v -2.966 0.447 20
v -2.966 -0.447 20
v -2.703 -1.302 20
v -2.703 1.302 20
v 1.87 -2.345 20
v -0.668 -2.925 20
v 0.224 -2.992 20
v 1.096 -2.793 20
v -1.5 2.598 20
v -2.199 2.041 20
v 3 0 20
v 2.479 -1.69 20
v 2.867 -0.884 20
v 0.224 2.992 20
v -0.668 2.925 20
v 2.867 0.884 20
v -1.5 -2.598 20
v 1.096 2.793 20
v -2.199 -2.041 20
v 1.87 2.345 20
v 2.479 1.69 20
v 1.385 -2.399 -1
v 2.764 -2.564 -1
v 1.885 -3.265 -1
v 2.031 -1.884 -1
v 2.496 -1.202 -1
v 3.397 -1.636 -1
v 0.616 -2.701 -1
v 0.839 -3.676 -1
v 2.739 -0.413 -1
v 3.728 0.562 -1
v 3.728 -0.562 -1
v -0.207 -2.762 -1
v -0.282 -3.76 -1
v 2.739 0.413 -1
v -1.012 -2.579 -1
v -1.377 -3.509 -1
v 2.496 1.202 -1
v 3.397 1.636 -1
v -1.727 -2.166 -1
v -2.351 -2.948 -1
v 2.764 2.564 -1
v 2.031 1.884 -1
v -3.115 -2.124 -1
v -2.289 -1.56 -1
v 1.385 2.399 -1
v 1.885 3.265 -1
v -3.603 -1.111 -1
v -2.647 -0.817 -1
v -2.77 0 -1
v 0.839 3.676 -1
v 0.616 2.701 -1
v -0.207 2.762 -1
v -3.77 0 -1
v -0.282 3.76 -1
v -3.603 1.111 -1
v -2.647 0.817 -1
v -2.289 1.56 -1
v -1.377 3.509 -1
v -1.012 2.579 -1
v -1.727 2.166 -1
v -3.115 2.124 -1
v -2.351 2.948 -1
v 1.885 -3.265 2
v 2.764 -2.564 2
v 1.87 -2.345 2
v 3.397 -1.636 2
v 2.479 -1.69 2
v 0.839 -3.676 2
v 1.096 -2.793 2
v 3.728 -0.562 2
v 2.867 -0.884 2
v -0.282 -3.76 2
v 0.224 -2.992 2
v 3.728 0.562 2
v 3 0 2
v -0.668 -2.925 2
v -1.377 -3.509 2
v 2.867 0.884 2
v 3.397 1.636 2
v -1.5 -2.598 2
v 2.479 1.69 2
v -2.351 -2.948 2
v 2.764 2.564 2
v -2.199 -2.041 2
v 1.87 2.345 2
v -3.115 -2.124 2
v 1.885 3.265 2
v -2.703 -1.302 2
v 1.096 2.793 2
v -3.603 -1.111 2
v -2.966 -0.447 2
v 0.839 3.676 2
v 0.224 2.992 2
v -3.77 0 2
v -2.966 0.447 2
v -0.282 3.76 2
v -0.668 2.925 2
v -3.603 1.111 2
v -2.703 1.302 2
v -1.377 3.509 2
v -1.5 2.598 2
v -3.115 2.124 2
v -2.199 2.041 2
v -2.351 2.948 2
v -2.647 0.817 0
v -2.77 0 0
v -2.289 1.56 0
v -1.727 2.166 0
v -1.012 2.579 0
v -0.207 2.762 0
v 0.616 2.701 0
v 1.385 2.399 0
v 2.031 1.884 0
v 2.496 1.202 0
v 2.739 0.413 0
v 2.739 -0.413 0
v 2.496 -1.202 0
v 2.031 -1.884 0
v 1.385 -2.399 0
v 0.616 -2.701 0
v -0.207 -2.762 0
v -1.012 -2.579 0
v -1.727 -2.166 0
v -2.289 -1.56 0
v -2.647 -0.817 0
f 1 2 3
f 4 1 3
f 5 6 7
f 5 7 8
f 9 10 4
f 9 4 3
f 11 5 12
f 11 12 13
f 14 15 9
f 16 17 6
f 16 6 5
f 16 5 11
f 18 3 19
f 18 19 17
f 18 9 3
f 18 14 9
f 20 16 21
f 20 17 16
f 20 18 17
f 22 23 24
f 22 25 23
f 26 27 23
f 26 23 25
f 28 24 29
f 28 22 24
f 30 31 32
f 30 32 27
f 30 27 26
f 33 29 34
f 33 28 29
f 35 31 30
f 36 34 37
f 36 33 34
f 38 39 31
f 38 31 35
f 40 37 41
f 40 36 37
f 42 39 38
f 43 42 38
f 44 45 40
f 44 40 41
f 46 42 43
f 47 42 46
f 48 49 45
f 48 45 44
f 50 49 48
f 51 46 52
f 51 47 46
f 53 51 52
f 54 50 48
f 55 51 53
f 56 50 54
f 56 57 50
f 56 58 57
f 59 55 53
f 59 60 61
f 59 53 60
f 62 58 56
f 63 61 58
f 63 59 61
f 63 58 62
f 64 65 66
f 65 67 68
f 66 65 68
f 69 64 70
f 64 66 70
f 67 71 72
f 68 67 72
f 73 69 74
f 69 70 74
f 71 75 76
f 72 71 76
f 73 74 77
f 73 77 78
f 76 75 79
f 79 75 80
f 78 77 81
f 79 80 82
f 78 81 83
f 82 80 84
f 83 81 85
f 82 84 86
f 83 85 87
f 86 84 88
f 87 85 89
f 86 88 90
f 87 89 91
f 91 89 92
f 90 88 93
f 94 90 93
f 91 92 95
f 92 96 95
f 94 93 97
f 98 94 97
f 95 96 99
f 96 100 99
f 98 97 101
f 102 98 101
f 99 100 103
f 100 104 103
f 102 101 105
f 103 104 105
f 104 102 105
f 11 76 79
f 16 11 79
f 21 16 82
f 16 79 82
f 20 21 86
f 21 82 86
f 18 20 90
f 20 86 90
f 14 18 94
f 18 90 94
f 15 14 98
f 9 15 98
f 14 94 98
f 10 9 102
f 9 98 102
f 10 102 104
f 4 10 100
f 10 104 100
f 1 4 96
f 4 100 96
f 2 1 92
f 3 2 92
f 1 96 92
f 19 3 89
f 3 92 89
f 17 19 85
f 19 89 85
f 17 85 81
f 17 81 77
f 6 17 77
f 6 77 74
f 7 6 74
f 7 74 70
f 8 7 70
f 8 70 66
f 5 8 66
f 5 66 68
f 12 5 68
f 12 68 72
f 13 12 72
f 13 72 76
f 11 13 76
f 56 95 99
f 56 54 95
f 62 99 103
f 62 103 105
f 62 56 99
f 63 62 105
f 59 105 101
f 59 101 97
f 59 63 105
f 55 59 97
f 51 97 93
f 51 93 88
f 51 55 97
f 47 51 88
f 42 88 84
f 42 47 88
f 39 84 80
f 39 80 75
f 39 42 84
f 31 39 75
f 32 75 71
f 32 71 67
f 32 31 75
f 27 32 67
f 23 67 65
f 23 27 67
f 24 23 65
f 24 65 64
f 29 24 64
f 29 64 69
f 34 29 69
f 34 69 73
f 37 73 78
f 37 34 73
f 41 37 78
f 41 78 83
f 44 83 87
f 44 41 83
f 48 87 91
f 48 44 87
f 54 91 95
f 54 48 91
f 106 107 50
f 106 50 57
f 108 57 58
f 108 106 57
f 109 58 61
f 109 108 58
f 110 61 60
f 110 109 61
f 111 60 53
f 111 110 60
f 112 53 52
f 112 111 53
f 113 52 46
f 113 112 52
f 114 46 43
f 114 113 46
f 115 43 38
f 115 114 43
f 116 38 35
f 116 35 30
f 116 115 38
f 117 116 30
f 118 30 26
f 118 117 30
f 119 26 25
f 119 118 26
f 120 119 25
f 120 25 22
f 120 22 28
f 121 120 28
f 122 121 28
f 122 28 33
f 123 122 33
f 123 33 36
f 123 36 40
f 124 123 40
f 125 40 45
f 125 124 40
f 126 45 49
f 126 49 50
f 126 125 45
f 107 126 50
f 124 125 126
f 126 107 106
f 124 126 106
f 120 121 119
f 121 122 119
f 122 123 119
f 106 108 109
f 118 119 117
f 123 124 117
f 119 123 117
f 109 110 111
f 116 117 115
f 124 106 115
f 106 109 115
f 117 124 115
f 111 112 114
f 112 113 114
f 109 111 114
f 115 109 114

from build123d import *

# Parameters (mm, degrees)
SKETCH1_R                = 3
BOSS_EXTRUDE1_DEPTH      = 20
SKETCH2_R                = 3.770107986
SKETCH2_R_2              = 2.770107986
EXTRUDE_THIN1_DEPTH      = 1
EXTRUDE_THIN1_DEPTH_BACK = 2


with BuildPart() as part:
    # Sketch1 → Boss-Extrude1 (new body)
    with BuildSketch(Plane.XY):
        Circle(SKETCH1_R)
    extrude(amount=BOSS_EXTRUDE1_DEPTH)

    # Sketch2 → Extrude-Thin1 (add, two sides)
    with BuildSketch(Plane(origin=(0, 0, 0), x_dir=(-1, 0, 0), z_dir=(0, 0, -1))) as extrude_thin1_sk:
        Circle(SKETCH2_R)
        Circle(SKETCH2_R_2, mode=Mode.SUBTRACT)
    extrude(amount=EXTRUDE_THIN1_DEPTH)
    extrude(extrude_thin1_sk.sketch, amount=-EXTRUDE_THIN1_DEPTH_BACK)


solid = part.part
